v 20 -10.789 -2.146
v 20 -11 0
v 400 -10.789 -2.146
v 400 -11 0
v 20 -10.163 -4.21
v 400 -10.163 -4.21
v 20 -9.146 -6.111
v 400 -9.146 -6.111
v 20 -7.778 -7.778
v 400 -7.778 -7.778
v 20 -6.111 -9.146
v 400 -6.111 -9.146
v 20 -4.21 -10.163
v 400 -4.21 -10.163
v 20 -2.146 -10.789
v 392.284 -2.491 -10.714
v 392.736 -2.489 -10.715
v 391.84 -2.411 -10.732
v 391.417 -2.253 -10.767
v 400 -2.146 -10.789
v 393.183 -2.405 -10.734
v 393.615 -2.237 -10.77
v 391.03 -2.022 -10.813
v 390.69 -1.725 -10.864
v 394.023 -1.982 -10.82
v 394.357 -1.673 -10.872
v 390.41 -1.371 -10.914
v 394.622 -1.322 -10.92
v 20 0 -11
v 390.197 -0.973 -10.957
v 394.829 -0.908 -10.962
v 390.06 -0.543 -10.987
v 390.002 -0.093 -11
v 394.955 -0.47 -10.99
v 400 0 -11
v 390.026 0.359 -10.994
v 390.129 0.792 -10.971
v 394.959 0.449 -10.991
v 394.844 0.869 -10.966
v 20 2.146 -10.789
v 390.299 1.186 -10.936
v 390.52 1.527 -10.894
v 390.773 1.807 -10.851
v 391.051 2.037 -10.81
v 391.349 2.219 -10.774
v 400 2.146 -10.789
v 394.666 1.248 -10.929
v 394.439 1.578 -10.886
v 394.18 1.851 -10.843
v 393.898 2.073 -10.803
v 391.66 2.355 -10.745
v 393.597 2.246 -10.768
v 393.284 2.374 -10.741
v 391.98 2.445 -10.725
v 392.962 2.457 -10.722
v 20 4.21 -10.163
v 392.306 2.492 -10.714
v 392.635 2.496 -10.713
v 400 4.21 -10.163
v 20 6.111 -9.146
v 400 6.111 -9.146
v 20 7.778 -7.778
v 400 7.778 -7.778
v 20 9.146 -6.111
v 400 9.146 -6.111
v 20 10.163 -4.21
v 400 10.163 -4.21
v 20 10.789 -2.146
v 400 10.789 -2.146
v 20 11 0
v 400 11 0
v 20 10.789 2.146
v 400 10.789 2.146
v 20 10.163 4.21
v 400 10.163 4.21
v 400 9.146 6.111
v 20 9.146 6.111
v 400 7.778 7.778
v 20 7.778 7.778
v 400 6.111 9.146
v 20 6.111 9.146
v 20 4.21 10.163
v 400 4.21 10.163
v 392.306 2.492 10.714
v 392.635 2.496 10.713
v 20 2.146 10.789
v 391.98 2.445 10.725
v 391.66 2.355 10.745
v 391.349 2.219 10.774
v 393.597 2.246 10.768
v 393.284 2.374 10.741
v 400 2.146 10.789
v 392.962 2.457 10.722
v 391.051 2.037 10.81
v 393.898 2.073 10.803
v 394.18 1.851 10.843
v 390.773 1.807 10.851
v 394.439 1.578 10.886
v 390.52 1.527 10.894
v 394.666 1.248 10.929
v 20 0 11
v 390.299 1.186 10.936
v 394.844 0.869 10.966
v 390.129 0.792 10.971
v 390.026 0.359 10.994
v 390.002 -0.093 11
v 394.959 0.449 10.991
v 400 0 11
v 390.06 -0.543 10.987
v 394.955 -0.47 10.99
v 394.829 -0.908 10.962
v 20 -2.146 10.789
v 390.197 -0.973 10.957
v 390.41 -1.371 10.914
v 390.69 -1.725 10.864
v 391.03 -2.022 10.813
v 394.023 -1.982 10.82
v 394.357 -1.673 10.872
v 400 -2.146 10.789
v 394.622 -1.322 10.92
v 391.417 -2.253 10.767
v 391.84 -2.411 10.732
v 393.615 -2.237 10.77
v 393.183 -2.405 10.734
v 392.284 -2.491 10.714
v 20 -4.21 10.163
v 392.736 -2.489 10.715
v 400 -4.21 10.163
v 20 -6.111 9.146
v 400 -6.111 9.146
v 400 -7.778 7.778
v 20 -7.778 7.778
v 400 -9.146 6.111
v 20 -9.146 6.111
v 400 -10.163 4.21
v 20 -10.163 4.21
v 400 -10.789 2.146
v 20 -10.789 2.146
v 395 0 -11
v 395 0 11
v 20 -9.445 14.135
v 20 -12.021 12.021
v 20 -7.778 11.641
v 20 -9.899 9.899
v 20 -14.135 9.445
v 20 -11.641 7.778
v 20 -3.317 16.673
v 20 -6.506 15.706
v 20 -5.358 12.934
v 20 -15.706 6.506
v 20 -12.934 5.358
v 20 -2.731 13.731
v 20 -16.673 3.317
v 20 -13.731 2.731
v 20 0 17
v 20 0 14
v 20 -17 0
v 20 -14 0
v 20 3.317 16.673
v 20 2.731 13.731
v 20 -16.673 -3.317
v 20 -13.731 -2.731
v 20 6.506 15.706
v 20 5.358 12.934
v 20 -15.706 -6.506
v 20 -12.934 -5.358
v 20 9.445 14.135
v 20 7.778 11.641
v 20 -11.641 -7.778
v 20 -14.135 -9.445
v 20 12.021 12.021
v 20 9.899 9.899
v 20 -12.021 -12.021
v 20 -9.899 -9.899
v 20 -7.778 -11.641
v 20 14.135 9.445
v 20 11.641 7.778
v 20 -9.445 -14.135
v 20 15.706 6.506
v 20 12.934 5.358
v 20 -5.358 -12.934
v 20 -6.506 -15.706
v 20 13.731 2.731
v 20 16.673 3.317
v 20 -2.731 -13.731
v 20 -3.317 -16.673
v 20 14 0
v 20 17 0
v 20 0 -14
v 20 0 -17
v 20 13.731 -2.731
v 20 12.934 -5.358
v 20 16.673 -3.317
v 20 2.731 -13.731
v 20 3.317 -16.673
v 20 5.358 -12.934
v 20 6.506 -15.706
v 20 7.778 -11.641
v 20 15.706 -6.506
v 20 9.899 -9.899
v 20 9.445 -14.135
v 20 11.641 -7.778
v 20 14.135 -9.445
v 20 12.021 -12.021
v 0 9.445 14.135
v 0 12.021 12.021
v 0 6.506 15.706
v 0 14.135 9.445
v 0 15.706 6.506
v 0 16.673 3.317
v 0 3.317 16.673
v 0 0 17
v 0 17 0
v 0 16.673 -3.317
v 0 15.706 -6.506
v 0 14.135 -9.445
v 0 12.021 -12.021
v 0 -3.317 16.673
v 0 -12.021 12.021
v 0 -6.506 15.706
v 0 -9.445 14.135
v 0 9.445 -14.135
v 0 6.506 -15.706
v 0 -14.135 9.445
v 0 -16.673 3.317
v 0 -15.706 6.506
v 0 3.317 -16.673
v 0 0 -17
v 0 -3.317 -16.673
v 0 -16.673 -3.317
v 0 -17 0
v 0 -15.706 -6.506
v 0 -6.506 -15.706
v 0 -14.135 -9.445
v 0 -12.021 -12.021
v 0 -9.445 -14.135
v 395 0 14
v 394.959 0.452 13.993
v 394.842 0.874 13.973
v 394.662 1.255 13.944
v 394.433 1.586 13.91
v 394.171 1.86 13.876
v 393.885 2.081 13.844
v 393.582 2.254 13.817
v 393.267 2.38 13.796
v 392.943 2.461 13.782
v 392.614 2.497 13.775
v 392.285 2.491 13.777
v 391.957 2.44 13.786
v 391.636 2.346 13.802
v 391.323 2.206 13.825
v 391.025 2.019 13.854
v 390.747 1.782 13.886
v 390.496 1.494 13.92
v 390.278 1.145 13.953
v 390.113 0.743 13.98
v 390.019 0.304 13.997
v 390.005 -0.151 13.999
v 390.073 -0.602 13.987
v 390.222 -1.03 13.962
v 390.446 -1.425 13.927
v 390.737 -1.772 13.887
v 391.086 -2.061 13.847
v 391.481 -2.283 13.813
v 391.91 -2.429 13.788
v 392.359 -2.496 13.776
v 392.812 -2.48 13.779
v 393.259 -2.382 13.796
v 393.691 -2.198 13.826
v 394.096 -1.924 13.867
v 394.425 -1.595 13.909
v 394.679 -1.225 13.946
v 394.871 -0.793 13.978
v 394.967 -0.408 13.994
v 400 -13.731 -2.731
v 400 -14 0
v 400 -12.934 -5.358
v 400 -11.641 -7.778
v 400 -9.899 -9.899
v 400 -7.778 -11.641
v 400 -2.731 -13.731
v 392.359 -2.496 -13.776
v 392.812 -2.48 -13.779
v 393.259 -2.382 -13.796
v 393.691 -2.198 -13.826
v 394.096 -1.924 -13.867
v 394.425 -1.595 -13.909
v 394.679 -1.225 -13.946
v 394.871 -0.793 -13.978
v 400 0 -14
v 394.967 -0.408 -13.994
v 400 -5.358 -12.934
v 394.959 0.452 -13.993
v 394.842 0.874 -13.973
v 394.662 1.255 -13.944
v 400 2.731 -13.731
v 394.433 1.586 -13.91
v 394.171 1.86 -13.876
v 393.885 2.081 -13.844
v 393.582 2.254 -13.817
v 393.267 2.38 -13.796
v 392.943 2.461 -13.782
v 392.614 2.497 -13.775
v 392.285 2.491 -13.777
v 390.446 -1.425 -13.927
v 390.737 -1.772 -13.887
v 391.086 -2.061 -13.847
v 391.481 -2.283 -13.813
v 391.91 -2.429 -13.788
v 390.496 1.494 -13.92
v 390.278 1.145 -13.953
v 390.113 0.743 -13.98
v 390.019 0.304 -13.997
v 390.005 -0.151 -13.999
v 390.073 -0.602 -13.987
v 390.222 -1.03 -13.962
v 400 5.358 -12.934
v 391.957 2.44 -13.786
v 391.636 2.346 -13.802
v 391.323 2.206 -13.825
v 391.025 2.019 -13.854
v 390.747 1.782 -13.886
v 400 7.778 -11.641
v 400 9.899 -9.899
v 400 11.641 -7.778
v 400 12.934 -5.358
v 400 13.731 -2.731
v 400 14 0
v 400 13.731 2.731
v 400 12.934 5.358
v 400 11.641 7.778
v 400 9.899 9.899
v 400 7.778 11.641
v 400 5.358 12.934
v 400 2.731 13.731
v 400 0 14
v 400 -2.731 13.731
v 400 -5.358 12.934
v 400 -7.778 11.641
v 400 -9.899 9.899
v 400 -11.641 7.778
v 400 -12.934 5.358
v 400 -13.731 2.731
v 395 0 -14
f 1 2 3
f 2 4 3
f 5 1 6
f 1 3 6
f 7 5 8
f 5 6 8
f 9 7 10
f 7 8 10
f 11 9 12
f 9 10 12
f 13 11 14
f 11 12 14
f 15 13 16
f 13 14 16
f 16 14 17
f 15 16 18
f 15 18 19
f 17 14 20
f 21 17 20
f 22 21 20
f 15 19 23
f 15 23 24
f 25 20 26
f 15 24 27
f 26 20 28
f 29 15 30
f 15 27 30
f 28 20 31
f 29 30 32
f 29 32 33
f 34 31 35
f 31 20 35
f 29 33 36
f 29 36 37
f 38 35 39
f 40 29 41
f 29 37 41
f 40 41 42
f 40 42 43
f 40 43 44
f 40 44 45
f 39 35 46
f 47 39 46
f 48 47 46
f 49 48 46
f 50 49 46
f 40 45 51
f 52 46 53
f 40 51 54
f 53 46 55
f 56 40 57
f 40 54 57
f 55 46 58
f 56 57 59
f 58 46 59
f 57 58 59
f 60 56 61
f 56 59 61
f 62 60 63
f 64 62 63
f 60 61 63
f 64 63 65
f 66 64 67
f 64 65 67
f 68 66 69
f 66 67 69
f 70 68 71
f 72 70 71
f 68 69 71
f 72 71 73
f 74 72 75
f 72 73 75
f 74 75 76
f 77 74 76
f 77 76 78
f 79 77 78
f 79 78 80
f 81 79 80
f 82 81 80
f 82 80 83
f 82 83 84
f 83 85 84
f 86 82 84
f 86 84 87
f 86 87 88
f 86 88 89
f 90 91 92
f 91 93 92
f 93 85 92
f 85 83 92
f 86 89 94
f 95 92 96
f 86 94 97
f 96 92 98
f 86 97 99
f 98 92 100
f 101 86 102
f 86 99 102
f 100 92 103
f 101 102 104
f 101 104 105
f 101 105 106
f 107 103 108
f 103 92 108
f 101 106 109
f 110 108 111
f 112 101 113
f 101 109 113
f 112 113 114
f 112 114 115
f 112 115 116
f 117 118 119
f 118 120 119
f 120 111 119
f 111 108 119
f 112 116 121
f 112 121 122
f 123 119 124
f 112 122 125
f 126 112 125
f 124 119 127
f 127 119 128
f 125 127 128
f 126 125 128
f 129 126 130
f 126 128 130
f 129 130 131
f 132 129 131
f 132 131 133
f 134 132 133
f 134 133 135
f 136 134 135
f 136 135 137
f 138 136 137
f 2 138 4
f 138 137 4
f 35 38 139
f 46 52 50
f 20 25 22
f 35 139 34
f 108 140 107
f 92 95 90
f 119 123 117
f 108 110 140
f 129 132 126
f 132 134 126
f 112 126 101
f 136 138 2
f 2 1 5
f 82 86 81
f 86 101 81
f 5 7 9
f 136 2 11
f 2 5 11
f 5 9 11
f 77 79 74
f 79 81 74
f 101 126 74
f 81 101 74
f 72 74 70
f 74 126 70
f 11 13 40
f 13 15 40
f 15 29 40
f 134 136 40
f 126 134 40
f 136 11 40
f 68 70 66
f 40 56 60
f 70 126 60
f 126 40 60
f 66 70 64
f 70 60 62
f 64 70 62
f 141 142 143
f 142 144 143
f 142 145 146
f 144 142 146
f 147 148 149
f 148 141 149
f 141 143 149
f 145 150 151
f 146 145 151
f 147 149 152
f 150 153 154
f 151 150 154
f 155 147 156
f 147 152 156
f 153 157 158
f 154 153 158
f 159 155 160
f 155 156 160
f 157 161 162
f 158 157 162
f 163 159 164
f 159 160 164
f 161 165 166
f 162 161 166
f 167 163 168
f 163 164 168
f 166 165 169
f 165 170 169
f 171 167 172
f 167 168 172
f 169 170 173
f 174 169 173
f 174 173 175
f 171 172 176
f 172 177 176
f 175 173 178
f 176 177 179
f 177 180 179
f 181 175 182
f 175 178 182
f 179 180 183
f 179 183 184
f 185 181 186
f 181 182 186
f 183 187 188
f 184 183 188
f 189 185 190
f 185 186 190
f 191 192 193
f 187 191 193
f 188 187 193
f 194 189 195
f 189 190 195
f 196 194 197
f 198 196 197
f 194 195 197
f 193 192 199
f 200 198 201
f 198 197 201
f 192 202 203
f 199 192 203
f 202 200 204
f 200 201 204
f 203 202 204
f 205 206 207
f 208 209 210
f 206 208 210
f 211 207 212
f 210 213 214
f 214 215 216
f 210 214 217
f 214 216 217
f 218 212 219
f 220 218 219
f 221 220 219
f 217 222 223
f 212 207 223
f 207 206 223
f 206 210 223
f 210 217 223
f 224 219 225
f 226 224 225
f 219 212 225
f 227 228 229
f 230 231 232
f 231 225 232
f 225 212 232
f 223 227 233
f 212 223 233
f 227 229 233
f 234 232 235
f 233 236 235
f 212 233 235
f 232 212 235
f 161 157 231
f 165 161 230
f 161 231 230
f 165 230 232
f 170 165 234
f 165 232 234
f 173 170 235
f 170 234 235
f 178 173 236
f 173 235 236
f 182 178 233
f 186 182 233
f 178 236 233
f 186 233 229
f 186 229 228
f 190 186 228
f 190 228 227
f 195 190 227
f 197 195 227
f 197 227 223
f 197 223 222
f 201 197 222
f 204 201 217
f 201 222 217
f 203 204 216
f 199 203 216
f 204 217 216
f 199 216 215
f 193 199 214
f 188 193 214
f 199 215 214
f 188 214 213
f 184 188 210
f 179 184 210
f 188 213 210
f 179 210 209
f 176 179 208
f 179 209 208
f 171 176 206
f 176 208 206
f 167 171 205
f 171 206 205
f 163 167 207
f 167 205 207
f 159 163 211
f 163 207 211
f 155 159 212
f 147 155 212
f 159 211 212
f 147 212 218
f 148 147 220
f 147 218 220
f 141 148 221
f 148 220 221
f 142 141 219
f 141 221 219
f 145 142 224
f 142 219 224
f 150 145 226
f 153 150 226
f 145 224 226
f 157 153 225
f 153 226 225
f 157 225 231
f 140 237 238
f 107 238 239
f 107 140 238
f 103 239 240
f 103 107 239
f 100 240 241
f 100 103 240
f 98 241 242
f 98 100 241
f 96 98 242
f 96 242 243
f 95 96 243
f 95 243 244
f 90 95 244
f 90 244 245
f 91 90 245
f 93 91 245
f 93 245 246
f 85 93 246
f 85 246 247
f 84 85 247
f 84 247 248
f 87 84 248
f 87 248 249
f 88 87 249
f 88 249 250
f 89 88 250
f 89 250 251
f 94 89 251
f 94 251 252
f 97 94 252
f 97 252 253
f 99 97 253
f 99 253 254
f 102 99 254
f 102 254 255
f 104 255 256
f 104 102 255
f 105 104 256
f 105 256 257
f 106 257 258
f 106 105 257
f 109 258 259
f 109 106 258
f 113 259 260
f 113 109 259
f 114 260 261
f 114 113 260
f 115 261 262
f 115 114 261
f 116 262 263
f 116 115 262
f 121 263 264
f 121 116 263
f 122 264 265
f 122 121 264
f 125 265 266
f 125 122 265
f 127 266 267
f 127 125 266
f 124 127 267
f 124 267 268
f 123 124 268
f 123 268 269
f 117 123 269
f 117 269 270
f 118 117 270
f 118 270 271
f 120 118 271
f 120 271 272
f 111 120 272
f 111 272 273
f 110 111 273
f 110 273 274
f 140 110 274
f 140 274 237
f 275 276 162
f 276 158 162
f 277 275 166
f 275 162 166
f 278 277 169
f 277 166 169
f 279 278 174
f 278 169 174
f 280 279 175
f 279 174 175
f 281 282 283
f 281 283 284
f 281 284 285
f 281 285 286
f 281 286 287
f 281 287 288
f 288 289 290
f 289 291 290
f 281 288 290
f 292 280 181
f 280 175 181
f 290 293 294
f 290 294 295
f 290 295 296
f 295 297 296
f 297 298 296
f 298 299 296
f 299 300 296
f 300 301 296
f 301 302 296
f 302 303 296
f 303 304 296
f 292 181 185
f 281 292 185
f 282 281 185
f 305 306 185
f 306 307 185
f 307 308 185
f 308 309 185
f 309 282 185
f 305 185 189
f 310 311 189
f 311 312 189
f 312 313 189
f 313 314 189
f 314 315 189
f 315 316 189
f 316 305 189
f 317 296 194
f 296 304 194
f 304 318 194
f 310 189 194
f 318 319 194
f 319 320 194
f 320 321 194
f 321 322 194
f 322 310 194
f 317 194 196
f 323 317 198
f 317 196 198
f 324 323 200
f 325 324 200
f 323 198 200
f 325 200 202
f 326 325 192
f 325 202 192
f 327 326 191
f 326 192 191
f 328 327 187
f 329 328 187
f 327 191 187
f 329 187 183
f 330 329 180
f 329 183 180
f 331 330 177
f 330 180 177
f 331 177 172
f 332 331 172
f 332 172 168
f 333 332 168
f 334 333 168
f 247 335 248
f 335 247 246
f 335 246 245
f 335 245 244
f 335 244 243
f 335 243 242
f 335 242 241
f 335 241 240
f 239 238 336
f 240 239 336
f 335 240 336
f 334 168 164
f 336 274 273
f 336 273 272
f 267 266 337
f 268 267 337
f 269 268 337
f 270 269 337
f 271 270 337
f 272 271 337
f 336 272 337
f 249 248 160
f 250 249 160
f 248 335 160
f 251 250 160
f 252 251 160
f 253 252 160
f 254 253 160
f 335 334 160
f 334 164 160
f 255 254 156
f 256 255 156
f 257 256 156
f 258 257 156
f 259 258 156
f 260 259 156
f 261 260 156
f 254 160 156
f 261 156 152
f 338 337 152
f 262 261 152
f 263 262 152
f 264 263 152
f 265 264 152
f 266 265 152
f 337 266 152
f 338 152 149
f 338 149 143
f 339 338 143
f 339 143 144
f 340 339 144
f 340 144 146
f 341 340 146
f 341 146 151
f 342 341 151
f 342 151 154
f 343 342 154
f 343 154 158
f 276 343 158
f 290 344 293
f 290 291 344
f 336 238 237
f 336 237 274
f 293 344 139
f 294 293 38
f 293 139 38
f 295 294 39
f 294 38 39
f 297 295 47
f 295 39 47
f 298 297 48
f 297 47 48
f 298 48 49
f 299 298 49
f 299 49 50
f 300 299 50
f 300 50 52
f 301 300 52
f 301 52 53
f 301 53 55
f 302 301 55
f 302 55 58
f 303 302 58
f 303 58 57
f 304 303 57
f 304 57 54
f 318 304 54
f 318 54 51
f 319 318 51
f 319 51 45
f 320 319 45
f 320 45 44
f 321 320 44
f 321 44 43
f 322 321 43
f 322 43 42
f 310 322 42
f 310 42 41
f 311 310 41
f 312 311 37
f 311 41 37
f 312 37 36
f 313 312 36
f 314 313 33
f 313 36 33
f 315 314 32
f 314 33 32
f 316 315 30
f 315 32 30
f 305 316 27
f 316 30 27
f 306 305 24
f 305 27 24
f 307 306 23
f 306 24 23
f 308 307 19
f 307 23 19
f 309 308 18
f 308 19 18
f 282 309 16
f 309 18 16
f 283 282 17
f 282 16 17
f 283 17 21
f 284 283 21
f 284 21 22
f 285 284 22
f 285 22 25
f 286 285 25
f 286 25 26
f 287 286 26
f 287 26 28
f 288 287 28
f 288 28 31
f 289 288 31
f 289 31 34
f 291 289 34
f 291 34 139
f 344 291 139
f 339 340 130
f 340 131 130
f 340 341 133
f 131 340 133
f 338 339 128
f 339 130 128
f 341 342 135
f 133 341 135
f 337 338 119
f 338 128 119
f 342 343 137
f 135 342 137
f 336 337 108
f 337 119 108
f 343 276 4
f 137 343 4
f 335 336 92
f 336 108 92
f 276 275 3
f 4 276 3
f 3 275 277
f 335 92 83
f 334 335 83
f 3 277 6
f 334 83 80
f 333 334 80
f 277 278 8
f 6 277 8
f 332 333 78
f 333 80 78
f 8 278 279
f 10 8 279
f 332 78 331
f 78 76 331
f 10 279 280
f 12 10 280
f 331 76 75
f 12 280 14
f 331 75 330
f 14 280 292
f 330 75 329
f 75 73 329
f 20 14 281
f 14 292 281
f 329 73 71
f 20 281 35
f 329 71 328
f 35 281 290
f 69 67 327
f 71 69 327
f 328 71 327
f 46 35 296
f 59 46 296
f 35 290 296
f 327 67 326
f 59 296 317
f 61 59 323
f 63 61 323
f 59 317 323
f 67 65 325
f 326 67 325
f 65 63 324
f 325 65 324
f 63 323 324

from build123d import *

# Parameters (mm, degrees)
SKETCH2_R               = 2.5
CUT_EXTRUDE1_DEPTH      = 18
CUT_EXTRUDE1_DEPTH_BACK = 18


with BuildPart() as part:
    # Sketch1 → Revolve1 (revolve)
    with BuildSketch(Plane.XY):
        Polygon((0, 0), (20, 0), (20, -11), (400, -11), (400, -14), (20, -14), (20, -17), (0, -17), align=None)
    revolve(axis=Axis((0, 0, 0), (1, 0, 0)))

    # Sketch2 → Cut-Extrude1 (cut, two sides)
    with BuildSketch(Plane.XY) as cut_extrude1_sk:
        with Locations((392.5, 0)):
            Circle(SKETCH2_R)
    extrude(amount=CUT_EXTRUDE1_DEPTH, mode=Mode.SUBTRACT)
    extrude(cut_extrude1_sk.sketch, amount=-CUT_EXTRUDE1_DEPTH_BACK, mode=Mode.SUBTRACT)


solid = part.part
